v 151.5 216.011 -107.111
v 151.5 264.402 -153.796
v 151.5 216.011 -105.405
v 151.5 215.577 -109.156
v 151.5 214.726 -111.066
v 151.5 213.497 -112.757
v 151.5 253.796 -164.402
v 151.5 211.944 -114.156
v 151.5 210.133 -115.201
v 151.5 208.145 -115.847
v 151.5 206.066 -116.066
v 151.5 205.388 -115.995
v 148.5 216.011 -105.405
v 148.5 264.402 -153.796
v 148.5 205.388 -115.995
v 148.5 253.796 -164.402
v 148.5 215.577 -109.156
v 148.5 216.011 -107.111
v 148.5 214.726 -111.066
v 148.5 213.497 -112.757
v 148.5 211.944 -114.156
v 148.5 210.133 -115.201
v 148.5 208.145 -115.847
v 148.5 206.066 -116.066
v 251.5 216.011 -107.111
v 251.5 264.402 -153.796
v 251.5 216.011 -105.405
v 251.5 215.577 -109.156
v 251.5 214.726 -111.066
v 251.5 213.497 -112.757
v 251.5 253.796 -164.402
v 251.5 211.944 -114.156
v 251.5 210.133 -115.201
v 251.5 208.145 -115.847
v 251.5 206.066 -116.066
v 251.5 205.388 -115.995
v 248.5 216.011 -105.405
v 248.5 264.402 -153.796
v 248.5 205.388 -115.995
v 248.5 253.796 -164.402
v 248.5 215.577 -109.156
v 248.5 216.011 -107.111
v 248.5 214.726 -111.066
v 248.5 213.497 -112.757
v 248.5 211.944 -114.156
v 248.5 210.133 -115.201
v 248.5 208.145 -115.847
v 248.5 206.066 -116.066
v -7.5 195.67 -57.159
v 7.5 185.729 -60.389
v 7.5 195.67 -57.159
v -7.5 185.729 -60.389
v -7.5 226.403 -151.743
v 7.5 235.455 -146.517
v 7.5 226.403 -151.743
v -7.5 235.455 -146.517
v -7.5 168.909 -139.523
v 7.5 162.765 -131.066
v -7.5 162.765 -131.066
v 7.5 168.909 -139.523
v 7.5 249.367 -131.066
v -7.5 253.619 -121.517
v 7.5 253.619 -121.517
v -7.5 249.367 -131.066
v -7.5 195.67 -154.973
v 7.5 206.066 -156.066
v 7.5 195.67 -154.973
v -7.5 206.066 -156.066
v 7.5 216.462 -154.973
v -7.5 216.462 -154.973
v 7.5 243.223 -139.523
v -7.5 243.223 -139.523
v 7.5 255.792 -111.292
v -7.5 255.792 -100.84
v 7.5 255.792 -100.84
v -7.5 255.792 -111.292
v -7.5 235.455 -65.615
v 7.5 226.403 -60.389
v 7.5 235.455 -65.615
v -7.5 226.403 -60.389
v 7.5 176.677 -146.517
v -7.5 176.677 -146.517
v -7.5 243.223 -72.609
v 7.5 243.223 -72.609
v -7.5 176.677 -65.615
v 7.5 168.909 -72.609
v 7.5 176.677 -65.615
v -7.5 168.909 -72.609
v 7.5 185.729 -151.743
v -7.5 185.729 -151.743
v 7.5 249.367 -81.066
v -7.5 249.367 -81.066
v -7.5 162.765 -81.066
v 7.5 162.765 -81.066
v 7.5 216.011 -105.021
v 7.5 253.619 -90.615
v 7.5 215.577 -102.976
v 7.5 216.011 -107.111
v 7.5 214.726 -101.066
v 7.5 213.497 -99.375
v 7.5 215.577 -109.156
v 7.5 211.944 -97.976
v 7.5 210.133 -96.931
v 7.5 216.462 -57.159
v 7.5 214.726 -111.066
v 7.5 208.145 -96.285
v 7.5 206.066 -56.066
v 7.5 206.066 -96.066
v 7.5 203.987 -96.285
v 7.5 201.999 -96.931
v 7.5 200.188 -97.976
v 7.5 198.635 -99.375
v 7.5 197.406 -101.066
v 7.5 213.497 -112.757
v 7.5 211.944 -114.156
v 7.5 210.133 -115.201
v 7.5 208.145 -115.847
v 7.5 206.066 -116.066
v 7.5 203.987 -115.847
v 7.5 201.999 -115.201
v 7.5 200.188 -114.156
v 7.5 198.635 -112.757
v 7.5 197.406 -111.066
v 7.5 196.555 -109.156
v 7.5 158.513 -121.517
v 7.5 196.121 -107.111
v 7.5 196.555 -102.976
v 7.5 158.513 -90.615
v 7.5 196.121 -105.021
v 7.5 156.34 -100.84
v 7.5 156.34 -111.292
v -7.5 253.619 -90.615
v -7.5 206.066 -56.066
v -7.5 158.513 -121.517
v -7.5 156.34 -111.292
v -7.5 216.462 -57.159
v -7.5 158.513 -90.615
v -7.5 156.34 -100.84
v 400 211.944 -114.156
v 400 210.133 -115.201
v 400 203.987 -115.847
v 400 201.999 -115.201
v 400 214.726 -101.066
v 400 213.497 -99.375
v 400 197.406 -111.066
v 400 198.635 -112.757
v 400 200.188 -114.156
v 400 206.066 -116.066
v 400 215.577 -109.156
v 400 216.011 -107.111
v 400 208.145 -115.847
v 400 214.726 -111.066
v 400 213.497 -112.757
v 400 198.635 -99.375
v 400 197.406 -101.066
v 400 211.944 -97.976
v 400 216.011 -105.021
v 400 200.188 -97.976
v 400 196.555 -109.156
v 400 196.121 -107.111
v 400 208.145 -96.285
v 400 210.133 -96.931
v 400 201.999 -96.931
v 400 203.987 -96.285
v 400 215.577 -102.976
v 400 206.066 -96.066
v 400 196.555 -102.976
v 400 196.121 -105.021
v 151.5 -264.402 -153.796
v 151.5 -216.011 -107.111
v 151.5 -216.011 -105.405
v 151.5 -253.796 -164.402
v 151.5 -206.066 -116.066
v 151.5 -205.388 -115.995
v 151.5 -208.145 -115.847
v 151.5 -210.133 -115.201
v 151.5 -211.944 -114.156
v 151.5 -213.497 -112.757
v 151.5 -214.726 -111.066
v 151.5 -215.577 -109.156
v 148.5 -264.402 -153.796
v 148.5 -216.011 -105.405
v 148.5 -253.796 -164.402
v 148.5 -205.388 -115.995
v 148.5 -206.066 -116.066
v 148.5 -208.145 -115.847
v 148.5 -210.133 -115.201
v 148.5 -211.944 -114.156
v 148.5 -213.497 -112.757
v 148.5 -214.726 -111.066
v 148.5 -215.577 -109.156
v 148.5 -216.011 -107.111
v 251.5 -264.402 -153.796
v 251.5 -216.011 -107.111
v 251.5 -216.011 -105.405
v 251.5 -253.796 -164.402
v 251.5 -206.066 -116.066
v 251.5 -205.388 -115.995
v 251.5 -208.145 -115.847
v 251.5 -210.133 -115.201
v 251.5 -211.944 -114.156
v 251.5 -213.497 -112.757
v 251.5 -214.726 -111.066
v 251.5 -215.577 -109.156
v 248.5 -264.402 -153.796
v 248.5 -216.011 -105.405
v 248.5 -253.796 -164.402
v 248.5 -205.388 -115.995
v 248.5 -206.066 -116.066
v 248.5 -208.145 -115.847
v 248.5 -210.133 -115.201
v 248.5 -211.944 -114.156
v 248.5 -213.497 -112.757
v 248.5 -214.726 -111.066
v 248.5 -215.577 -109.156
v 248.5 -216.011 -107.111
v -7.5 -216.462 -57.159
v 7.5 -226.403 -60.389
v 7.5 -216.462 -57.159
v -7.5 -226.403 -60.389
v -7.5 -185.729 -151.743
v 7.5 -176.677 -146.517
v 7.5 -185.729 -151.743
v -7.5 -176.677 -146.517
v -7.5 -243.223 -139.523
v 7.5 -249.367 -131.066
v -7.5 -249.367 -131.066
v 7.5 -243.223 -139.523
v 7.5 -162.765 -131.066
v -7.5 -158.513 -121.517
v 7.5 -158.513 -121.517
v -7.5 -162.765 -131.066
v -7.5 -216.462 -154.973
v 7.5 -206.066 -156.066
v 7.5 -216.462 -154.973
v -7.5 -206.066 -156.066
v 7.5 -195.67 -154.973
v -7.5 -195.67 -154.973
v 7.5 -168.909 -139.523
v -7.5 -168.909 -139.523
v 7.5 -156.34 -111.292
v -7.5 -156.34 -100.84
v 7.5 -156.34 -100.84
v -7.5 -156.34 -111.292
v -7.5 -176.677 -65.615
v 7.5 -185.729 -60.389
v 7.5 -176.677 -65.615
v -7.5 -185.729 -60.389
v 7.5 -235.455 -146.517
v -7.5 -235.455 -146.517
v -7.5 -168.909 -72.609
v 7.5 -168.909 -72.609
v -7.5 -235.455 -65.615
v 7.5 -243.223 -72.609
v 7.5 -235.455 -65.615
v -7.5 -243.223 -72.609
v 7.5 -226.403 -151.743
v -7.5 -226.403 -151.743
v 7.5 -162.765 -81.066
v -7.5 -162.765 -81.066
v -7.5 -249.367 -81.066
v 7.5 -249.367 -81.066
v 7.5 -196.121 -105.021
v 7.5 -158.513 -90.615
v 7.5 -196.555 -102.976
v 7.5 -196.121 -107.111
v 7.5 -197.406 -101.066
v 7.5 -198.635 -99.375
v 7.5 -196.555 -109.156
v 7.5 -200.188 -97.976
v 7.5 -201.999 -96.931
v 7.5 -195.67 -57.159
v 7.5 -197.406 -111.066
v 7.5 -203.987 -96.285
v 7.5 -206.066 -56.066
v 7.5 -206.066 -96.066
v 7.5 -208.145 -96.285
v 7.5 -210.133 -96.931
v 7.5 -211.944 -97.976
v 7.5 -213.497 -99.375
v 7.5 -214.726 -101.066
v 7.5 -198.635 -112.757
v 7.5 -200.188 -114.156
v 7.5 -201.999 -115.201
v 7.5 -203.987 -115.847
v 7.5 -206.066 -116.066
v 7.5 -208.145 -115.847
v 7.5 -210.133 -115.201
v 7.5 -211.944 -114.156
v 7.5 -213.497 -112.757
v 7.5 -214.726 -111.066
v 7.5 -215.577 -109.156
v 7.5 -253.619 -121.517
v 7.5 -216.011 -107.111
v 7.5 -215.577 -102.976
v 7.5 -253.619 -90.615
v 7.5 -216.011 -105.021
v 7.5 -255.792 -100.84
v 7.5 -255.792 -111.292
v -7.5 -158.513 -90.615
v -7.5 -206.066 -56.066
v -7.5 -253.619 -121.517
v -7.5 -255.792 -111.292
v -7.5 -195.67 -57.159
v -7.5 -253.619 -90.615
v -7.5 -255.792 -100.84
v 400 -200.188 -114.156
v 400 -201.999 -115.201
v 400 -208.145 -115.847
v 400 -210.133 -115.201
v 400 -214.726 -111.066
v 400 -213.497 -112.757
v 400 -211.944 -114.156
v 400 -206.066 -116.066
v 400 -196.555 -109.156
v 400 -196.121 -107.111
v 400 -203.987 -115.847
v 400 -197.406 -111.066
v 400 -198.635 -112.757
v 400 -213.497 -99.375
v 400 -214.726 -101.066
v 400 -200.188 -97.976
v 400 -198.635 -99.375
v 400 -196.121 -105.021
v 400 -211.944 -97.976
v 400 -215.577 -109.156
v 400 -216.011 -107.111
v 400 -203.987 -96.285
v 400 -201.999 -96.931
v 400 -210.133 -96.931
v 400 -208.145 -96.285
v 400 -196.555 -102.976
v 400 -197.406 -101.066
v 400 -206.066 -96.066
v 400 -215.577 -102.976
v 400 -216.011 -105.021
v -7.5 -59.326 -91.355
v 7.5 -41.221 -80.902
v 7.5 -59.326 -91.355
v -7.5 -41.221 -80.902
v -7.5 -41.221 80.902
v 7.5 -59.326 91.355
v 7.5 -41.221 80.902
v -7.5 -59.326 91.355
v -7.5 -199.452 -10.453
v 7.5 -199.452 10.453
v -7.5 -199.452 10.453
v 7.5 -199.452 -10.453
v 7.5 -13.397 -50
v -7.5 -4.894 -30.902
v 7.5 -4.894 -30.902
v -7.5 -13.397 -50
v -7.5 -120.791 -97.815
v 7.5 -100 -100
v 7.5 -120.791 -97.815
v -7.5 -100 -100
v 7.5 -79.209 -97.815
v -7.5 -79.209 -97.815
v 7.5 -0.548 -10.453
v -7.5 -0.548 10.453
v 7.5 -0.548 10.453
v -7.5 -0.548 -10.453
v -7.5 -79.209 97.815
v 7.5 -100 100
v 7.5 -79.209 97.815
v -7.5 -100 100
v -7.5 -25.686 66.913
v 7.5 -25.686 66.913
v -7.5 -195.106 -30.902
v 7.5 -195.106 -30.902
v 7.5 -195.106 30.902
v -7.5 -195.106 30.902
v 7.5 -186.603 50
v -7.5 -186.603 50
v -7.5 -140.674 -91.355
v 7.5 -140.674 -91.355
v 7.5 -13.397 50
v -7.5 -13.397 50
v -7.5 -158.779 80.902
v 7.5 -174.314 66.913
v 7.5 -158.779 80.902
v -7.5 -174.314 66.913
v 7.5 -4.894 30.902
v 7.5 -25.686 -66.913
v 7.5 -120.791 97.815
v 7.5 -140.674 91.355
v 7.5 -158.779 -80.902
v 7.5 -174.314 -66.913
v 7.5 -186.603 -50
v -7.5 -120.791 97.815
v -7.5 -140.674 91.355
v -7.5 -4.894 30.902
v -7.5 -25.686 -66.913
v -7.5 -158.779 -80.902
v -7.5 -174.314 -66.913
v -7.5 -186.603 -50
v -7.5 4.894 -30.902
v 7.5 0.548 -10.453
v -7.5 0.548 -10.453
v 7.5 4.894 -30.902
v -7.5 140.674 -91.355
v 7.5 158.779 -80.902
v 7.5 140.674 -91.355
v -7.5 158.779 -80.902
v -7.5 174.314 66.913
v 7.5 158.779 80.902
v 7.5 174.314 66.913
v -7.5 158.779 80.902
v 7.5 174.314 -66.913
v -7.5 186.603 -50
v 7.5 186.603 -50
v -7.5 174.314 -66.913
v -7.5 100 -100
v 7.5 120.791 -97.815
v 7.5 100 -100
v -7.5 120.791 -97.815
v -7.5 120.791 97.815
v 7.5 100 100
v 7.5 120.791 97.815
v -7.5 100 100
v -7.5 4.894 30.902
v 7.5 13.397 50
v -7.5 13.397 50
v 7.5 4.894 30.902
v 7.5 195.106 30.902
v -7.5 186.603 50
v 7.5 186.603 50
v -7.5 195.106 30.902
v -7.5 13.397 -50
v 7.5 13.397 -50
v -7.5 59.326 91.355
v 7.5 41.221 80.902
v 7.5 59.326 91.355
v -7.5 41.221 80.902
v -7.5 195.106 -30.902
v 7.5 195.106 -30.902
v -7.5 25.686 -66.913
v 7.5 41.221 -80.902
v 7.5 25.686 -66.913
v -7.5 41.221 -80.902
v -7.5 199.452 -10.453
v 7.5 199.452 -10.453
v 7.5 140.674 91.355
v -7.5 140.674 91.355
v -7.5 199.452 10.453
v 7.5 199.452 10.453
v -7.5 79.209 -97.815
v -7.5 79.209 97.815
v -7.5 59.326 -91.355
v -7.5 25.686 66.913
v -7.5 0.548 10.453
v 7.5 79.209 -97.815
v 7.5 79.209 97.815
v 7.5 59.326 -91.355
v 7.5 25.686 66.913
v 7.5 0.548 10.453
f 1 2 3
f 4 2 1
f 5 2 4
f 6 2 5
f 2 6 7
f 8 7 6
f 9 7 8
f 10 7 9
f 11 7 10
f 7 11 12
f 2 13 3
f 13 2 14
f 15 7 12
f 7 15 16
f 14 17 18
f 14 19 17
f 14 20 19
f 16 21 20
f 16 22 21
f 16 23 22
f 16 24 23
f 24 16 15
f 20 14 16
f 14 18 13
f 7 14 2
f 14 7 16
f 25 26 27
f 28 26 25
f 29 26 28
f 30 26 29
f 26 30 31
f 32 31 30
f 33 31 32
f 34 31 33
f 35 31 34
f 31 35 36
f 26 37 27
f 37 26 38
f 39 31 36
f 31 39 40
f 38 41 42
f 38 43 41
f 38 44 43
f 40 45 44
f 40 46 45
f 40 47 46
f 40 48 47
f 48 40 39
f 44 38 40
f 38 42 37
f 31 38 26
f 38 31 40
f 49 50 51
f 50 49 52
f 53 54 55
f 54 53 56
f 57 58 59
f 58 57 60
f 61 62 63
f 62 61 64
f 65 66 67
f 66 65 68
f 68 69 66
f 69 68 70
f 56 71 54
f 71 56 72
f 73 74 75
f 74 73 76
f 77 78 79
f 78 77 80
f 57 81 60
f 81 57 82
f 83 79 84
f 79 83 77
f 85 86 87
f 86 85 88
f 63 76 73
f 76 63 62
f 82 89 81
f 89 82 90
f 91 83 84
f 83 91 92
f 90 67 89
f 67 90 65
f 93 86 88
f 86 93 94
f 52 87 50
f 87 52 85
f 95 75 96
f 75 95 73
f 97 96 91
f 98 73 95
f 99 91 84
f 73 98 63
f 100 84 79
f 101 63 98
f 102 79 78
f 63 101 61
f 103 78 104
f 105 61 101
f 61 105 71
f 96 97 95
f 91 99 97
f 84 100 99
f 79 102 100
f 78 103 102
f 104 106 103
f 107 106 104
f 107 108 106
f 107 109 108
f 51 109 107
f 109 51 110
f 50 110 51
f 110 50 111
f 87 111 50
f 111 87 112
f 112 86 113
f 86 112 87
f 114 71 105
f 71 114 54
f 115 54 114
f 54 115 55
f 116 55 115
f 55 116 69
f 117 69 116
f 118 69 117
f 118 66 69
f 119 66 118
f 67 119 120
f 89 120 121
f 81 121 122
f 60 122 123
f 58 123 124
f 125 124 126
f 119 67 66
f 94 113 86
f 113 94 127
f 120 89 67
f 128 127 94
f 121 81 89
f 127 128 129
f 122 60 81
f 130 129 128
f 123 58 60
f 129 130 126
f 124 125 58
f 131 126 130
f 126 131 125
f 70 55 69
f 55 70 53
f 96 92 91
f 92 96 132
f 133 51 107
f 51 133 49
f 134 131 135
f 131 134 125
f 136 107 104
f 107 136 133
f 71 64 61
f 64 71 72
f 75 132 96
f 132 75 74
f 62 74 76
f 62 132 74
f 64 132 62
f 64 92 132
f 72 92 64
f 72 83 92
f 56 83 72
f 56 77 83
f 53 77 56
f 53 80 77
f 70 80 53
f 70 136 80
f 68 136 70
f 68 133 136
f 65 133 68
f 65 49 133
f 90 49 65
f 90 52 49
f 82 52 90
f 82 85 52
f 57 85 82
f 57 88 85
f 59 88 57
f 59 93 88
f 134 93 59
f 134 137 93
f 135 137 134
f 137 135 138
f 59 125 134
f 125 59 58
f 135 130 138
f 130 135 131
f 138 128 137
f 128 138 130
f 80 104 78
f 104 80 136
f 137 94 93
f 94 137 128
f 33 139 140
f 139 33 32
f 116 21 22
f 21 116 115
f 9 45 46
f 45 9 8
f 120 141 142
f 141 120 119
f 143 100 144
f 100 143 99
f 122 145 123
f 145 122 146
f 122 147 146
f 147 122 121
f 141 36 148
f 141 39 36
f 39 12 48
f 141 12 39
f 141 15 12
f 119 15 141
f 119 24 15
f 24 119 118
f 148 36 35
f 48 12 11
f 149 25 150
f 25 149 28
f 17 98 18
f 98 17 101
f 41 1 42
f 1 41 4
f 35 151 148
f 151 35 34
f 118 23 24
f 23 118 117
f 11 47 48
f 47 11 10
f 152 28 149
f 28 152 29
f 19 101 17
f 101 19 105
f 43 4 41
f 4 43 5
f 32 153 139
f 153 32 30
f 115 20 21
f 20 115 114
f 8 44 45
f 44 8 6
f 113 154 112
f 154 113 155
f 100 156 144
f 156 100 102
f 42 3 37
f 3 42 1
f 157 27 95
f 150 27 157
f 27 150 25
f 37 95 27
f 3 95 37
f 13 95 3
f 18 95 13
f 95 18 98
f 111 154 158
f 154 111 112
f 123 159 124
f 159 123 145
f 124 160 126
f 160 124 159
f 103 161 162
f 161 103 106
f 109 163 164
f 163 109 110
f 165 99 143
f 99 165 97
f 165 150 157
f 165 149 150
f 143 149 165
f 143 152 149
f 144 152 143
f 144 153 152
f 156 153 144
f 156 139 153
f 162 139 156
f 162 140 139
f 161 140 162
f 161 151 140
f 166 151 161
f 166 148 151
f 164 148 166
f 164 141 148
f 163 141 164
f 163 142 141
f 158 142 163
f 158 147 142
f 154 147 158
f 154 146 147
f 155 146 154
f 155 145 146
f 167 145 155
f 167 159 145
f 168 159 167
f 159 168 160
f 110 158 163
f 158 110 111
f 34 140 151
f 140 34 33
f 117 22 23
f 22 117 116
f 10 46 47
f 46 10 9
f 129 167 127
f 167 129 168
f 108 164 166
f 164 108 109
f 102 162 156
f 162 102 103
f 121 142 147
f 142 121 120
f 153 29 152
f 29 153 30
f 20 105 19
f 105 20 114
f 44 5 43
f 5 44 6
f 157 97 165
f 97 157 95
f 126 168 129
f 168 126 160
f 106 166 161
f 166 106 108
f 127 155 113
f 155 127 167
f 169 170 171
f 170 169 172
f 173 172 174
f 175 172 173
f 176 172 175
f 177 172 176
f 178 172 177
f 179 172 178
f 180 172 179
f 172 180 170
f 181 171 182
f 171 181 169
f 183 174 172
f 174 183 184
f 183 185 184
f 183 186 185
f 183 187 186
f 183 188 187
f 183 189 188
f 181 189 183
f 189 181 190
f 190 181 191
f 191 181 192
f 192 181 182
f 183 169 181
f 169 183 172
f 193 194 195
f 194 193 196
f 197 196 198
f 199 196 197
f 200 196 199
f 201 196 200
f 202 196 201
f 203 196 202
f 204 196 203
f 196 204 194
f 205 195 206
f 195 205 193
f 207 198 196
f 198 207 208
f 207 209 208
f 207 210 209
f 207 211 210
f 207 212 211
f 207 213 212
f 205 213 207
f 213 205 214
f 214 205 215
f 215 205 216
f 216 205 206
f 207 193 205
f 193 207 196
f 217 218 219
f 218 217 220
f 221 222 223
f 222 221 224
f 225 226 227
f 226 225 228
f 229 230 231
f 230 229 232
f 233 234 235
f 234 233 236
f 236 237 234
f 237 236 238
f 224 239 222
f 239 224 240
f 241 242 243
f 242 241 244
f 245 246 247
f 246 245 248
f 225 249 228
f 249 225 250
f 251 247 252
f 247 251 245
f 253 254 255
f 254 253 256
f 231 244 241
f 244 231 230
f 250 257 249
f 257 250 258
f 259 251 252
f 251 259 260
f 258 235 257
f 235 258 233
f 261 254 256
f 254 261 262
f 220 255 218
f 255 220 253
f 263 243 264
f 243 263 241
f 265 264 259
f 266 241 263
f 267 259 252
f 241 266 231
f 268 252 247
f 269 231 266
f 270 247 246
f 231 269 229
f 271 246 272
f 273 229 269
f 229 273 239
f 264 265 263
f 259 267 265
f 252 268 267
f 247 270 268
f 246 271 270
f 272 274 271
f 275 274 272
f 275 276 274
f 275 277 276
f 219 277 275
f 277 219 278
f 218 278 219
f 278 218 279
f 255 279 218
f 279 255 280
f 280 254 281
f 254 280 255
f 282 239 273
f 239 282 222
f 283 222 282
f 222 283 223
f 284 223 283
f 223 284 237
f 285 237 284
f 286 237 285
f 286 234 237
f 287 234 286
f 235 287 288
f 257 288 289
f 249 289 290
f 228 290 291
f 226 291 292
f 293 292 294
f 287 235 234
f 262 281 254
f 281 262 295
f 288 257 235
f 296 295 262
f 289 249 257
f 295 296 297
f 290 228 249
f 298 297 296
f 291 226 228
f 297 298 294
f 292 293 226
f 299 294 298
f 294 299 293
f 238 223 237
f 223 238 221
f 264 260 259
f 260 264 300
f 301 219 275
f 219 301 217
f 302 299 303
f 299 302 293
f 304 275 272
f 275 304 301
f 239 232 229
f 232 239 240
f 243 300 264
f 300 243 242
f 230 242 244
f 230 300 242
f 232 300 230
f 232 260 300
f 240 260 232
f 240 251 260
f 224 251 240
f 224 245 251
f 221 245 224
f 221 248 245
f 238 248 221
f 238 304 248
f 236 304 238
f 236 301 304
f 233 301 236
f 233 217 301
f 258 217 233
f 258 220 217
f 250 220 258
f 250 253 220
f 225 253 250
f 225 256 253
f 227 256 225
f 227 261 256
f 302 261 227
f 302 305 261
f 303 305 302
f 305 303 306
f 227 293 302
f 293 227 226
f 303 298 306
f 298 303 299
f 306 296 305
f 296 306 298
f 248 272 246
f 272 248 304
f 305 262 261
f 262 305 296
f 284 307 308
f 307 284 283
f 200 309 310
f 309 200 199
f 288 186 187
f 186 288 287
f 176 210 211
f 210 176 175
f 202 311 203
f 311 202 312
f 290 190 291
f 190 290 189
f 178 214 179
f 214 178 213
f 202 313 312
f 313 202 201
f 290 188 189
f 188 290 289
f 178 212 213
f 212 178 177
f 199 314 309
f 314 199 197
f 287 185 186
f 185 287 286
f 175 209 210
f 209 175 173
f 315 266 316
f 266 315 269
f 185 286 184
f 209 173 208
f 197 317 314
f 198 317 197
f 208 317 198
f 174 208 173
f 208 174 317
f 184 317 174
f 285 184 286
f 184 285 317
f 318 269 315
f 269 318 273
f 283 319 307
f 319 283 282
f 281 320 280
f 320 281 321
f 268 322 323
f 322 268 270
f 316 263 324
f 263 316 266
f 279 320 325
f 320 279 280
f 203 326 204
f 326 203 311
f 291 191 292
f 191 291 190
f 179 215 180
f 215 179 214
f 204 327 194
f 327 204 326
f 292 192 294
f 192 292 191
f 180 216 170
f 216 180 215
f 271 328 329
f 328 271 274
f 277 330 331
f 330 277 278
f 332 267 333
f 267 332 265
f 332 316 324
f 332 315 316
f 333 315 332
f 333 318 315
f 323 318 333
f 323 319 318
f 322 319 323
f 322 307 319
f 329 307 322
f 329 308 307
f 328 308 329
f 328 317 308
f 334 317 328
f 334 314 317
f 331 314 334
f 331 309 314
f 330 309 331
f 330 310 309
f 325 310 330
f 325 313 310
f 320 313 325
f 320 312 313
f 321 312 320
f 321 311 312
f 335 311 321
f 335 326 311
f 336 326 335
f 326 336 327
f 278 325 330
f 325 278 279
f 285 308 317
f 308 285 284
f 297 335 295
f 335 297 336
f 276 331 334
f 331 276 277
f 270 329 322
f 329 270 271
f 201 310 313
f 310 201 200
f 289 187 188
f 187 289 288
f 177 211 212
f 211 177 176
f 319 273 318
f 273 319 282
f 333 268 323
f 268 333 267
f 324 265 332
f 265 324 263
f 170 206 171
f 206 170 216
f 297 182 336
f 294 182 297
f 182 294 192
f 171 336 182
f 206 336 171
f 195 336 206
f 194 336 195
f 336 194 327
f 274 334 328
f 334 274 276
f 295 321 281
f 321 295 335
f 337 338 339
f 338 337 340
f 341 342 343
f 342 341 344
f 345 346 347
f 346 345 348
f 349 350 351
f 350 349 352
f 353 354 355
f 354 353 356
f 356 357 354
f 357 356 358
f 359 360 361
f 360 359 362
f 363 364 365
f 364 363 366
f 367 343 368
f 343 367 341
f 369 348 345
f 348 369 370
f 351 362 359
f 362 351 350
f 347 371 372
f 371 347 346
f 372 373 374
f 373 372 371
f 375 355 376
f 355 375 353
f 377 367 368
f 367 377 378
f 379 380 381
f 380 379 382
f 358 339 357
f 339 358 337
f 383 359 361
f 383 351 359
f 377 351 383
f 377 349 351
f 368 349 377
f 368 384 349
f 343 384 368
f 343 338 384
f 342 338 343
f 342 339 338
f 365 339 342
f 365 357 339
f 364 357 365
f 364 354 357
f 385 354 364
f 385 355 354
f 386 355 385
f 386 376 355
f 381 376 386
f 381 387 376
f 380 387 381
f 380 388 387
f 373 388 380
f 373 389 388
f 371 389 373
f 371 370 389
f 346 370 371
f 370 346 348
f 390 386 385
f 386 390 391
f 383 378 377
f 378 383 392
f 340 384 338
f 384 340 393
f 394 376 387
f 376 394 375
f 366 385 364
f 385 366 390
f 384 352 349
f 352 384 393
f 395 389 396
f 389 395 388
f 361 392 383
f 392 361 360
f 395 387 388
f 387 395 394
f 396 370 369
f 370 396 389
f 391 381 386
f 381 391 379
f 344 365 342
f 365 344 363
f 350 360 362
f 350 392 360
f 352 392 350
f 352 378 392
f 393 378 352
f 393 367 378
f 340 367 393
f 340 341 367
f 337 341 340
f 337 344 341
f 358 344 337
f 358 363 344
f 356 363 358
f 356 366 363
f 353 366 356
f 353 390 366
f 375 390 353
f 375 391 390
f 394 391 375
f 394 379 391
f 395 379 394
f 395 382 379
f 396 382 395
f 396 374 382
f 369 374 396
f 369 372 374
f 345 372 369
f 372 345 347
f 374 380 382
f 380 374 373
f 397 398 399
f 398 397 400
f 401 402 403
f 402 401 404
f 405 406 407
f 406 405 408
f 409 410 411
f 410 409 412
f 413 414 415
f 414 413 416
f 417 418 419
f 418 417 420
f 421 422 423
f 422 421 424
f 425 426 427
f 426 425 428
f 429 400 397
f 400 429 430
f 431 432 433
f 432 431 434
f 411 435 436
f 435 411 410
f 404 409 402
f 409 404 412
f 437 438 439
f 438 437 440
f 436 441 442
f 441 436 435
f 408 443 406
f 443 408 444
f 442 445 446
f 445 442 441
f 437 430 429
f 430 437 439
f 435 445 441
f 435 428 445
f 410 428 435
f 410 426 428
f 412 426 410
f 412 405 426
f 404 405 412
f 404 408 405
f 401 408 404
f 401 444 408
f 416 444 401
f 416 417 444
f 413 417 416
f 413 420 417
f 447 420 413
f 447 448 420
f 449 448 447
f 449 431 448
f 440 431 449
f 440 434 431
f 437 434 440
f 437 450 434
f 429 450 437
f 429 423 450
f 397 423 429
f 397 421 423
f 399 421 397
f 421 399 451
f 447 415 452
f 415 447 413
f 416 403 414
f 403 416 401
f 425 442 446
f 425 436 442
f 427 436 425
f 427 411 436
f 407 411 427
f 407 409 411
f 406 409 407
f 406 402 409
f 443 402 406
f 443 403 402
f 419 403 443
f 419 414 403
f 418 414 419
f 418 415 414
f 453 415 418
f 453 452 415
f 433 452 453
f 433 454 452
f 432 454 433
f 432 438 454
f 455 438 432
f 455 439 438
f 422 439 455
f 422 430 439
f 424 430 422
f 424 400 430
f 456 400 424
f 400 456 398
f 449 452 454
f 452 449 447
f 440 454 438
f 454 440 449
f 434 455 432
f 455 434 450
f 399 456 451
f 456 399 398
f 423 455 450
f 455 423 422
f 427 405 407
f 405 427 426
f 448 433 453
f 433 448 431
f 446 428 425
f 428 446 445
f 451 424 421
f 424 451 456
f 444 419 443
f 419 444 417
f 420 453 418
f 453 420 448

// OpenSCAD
module machine(){

link_gear_r = 100;
link_gear_h = 15;
module link_gear(){
	rotate([0,90,0])
		cylinder(r = link_gear_r, h = link_gear_h, center = true);
}
translate([0,-link_gear_r,0])
	link_gear();
translate([0,link_gear_r,0])
	link_gear();

paddle_gear_r = 50;
paddle_gear_h = 15;
paddle_gear_declination = 45;
paddle_gear_span = link_gear_r+(link_gear_r+paddle_gear_r)*cos(paddle_gear_declination);
paddle_gear_depth = (link_gear_r+paddle_gear_r)*sin(paddle_gear_declination);
module paddle_gear(){
	rotate([0,90,0])
		cylinder(r = paddle_gear_r, h = paddle_gear_h, center = true);
}

paddle_shaft_r = 10;
paddle_shaft_h = 400;
module paddle_shaft(){
	rotate([0,90,0])
		cylinder(r = paddle_shaft_r, h = paddle_shaft_h, center = true);
}

paddle_upper_l = 75;
paddle_upper_t = 3;
paddle_upper_w = 15;
paddle_upper_declination = 45;
paddle_bar_h = 100;
paddle_bar_r = 10;

module paddle(){
	rotate([-paddle_upper_declination,0,0]){
		translate([-paddle_bar_h/2,paddle_upper_l/2,0])
			cube([paddle_upper_t, paddle_upper_l, paddle_upper_w], center = true);
		translate([paddle_bar_h/2,paddle_upper_l/2,0])
			cube([paddle_upper_t, paddle_upper_l, paddle_upper_w], center = true);
	}
}

module arm(reverse){
	paddle_gear();
	translate([paddle_shaft_h/2,0,0])
		paddle_shaft();
	translate([paddle_shaft_h/2,0,0]){
		if(reverse){
			mirror([0,1,0])
				paddle();
		}else{
			paddle();
		}
	}
}

translate([0,paddle_gear_span,-paddle_gear_depth])
	arm(false);
translate([0,-paddle_gear_span,-paddle_gear_depth])
	arm(true);



























}

machine();
